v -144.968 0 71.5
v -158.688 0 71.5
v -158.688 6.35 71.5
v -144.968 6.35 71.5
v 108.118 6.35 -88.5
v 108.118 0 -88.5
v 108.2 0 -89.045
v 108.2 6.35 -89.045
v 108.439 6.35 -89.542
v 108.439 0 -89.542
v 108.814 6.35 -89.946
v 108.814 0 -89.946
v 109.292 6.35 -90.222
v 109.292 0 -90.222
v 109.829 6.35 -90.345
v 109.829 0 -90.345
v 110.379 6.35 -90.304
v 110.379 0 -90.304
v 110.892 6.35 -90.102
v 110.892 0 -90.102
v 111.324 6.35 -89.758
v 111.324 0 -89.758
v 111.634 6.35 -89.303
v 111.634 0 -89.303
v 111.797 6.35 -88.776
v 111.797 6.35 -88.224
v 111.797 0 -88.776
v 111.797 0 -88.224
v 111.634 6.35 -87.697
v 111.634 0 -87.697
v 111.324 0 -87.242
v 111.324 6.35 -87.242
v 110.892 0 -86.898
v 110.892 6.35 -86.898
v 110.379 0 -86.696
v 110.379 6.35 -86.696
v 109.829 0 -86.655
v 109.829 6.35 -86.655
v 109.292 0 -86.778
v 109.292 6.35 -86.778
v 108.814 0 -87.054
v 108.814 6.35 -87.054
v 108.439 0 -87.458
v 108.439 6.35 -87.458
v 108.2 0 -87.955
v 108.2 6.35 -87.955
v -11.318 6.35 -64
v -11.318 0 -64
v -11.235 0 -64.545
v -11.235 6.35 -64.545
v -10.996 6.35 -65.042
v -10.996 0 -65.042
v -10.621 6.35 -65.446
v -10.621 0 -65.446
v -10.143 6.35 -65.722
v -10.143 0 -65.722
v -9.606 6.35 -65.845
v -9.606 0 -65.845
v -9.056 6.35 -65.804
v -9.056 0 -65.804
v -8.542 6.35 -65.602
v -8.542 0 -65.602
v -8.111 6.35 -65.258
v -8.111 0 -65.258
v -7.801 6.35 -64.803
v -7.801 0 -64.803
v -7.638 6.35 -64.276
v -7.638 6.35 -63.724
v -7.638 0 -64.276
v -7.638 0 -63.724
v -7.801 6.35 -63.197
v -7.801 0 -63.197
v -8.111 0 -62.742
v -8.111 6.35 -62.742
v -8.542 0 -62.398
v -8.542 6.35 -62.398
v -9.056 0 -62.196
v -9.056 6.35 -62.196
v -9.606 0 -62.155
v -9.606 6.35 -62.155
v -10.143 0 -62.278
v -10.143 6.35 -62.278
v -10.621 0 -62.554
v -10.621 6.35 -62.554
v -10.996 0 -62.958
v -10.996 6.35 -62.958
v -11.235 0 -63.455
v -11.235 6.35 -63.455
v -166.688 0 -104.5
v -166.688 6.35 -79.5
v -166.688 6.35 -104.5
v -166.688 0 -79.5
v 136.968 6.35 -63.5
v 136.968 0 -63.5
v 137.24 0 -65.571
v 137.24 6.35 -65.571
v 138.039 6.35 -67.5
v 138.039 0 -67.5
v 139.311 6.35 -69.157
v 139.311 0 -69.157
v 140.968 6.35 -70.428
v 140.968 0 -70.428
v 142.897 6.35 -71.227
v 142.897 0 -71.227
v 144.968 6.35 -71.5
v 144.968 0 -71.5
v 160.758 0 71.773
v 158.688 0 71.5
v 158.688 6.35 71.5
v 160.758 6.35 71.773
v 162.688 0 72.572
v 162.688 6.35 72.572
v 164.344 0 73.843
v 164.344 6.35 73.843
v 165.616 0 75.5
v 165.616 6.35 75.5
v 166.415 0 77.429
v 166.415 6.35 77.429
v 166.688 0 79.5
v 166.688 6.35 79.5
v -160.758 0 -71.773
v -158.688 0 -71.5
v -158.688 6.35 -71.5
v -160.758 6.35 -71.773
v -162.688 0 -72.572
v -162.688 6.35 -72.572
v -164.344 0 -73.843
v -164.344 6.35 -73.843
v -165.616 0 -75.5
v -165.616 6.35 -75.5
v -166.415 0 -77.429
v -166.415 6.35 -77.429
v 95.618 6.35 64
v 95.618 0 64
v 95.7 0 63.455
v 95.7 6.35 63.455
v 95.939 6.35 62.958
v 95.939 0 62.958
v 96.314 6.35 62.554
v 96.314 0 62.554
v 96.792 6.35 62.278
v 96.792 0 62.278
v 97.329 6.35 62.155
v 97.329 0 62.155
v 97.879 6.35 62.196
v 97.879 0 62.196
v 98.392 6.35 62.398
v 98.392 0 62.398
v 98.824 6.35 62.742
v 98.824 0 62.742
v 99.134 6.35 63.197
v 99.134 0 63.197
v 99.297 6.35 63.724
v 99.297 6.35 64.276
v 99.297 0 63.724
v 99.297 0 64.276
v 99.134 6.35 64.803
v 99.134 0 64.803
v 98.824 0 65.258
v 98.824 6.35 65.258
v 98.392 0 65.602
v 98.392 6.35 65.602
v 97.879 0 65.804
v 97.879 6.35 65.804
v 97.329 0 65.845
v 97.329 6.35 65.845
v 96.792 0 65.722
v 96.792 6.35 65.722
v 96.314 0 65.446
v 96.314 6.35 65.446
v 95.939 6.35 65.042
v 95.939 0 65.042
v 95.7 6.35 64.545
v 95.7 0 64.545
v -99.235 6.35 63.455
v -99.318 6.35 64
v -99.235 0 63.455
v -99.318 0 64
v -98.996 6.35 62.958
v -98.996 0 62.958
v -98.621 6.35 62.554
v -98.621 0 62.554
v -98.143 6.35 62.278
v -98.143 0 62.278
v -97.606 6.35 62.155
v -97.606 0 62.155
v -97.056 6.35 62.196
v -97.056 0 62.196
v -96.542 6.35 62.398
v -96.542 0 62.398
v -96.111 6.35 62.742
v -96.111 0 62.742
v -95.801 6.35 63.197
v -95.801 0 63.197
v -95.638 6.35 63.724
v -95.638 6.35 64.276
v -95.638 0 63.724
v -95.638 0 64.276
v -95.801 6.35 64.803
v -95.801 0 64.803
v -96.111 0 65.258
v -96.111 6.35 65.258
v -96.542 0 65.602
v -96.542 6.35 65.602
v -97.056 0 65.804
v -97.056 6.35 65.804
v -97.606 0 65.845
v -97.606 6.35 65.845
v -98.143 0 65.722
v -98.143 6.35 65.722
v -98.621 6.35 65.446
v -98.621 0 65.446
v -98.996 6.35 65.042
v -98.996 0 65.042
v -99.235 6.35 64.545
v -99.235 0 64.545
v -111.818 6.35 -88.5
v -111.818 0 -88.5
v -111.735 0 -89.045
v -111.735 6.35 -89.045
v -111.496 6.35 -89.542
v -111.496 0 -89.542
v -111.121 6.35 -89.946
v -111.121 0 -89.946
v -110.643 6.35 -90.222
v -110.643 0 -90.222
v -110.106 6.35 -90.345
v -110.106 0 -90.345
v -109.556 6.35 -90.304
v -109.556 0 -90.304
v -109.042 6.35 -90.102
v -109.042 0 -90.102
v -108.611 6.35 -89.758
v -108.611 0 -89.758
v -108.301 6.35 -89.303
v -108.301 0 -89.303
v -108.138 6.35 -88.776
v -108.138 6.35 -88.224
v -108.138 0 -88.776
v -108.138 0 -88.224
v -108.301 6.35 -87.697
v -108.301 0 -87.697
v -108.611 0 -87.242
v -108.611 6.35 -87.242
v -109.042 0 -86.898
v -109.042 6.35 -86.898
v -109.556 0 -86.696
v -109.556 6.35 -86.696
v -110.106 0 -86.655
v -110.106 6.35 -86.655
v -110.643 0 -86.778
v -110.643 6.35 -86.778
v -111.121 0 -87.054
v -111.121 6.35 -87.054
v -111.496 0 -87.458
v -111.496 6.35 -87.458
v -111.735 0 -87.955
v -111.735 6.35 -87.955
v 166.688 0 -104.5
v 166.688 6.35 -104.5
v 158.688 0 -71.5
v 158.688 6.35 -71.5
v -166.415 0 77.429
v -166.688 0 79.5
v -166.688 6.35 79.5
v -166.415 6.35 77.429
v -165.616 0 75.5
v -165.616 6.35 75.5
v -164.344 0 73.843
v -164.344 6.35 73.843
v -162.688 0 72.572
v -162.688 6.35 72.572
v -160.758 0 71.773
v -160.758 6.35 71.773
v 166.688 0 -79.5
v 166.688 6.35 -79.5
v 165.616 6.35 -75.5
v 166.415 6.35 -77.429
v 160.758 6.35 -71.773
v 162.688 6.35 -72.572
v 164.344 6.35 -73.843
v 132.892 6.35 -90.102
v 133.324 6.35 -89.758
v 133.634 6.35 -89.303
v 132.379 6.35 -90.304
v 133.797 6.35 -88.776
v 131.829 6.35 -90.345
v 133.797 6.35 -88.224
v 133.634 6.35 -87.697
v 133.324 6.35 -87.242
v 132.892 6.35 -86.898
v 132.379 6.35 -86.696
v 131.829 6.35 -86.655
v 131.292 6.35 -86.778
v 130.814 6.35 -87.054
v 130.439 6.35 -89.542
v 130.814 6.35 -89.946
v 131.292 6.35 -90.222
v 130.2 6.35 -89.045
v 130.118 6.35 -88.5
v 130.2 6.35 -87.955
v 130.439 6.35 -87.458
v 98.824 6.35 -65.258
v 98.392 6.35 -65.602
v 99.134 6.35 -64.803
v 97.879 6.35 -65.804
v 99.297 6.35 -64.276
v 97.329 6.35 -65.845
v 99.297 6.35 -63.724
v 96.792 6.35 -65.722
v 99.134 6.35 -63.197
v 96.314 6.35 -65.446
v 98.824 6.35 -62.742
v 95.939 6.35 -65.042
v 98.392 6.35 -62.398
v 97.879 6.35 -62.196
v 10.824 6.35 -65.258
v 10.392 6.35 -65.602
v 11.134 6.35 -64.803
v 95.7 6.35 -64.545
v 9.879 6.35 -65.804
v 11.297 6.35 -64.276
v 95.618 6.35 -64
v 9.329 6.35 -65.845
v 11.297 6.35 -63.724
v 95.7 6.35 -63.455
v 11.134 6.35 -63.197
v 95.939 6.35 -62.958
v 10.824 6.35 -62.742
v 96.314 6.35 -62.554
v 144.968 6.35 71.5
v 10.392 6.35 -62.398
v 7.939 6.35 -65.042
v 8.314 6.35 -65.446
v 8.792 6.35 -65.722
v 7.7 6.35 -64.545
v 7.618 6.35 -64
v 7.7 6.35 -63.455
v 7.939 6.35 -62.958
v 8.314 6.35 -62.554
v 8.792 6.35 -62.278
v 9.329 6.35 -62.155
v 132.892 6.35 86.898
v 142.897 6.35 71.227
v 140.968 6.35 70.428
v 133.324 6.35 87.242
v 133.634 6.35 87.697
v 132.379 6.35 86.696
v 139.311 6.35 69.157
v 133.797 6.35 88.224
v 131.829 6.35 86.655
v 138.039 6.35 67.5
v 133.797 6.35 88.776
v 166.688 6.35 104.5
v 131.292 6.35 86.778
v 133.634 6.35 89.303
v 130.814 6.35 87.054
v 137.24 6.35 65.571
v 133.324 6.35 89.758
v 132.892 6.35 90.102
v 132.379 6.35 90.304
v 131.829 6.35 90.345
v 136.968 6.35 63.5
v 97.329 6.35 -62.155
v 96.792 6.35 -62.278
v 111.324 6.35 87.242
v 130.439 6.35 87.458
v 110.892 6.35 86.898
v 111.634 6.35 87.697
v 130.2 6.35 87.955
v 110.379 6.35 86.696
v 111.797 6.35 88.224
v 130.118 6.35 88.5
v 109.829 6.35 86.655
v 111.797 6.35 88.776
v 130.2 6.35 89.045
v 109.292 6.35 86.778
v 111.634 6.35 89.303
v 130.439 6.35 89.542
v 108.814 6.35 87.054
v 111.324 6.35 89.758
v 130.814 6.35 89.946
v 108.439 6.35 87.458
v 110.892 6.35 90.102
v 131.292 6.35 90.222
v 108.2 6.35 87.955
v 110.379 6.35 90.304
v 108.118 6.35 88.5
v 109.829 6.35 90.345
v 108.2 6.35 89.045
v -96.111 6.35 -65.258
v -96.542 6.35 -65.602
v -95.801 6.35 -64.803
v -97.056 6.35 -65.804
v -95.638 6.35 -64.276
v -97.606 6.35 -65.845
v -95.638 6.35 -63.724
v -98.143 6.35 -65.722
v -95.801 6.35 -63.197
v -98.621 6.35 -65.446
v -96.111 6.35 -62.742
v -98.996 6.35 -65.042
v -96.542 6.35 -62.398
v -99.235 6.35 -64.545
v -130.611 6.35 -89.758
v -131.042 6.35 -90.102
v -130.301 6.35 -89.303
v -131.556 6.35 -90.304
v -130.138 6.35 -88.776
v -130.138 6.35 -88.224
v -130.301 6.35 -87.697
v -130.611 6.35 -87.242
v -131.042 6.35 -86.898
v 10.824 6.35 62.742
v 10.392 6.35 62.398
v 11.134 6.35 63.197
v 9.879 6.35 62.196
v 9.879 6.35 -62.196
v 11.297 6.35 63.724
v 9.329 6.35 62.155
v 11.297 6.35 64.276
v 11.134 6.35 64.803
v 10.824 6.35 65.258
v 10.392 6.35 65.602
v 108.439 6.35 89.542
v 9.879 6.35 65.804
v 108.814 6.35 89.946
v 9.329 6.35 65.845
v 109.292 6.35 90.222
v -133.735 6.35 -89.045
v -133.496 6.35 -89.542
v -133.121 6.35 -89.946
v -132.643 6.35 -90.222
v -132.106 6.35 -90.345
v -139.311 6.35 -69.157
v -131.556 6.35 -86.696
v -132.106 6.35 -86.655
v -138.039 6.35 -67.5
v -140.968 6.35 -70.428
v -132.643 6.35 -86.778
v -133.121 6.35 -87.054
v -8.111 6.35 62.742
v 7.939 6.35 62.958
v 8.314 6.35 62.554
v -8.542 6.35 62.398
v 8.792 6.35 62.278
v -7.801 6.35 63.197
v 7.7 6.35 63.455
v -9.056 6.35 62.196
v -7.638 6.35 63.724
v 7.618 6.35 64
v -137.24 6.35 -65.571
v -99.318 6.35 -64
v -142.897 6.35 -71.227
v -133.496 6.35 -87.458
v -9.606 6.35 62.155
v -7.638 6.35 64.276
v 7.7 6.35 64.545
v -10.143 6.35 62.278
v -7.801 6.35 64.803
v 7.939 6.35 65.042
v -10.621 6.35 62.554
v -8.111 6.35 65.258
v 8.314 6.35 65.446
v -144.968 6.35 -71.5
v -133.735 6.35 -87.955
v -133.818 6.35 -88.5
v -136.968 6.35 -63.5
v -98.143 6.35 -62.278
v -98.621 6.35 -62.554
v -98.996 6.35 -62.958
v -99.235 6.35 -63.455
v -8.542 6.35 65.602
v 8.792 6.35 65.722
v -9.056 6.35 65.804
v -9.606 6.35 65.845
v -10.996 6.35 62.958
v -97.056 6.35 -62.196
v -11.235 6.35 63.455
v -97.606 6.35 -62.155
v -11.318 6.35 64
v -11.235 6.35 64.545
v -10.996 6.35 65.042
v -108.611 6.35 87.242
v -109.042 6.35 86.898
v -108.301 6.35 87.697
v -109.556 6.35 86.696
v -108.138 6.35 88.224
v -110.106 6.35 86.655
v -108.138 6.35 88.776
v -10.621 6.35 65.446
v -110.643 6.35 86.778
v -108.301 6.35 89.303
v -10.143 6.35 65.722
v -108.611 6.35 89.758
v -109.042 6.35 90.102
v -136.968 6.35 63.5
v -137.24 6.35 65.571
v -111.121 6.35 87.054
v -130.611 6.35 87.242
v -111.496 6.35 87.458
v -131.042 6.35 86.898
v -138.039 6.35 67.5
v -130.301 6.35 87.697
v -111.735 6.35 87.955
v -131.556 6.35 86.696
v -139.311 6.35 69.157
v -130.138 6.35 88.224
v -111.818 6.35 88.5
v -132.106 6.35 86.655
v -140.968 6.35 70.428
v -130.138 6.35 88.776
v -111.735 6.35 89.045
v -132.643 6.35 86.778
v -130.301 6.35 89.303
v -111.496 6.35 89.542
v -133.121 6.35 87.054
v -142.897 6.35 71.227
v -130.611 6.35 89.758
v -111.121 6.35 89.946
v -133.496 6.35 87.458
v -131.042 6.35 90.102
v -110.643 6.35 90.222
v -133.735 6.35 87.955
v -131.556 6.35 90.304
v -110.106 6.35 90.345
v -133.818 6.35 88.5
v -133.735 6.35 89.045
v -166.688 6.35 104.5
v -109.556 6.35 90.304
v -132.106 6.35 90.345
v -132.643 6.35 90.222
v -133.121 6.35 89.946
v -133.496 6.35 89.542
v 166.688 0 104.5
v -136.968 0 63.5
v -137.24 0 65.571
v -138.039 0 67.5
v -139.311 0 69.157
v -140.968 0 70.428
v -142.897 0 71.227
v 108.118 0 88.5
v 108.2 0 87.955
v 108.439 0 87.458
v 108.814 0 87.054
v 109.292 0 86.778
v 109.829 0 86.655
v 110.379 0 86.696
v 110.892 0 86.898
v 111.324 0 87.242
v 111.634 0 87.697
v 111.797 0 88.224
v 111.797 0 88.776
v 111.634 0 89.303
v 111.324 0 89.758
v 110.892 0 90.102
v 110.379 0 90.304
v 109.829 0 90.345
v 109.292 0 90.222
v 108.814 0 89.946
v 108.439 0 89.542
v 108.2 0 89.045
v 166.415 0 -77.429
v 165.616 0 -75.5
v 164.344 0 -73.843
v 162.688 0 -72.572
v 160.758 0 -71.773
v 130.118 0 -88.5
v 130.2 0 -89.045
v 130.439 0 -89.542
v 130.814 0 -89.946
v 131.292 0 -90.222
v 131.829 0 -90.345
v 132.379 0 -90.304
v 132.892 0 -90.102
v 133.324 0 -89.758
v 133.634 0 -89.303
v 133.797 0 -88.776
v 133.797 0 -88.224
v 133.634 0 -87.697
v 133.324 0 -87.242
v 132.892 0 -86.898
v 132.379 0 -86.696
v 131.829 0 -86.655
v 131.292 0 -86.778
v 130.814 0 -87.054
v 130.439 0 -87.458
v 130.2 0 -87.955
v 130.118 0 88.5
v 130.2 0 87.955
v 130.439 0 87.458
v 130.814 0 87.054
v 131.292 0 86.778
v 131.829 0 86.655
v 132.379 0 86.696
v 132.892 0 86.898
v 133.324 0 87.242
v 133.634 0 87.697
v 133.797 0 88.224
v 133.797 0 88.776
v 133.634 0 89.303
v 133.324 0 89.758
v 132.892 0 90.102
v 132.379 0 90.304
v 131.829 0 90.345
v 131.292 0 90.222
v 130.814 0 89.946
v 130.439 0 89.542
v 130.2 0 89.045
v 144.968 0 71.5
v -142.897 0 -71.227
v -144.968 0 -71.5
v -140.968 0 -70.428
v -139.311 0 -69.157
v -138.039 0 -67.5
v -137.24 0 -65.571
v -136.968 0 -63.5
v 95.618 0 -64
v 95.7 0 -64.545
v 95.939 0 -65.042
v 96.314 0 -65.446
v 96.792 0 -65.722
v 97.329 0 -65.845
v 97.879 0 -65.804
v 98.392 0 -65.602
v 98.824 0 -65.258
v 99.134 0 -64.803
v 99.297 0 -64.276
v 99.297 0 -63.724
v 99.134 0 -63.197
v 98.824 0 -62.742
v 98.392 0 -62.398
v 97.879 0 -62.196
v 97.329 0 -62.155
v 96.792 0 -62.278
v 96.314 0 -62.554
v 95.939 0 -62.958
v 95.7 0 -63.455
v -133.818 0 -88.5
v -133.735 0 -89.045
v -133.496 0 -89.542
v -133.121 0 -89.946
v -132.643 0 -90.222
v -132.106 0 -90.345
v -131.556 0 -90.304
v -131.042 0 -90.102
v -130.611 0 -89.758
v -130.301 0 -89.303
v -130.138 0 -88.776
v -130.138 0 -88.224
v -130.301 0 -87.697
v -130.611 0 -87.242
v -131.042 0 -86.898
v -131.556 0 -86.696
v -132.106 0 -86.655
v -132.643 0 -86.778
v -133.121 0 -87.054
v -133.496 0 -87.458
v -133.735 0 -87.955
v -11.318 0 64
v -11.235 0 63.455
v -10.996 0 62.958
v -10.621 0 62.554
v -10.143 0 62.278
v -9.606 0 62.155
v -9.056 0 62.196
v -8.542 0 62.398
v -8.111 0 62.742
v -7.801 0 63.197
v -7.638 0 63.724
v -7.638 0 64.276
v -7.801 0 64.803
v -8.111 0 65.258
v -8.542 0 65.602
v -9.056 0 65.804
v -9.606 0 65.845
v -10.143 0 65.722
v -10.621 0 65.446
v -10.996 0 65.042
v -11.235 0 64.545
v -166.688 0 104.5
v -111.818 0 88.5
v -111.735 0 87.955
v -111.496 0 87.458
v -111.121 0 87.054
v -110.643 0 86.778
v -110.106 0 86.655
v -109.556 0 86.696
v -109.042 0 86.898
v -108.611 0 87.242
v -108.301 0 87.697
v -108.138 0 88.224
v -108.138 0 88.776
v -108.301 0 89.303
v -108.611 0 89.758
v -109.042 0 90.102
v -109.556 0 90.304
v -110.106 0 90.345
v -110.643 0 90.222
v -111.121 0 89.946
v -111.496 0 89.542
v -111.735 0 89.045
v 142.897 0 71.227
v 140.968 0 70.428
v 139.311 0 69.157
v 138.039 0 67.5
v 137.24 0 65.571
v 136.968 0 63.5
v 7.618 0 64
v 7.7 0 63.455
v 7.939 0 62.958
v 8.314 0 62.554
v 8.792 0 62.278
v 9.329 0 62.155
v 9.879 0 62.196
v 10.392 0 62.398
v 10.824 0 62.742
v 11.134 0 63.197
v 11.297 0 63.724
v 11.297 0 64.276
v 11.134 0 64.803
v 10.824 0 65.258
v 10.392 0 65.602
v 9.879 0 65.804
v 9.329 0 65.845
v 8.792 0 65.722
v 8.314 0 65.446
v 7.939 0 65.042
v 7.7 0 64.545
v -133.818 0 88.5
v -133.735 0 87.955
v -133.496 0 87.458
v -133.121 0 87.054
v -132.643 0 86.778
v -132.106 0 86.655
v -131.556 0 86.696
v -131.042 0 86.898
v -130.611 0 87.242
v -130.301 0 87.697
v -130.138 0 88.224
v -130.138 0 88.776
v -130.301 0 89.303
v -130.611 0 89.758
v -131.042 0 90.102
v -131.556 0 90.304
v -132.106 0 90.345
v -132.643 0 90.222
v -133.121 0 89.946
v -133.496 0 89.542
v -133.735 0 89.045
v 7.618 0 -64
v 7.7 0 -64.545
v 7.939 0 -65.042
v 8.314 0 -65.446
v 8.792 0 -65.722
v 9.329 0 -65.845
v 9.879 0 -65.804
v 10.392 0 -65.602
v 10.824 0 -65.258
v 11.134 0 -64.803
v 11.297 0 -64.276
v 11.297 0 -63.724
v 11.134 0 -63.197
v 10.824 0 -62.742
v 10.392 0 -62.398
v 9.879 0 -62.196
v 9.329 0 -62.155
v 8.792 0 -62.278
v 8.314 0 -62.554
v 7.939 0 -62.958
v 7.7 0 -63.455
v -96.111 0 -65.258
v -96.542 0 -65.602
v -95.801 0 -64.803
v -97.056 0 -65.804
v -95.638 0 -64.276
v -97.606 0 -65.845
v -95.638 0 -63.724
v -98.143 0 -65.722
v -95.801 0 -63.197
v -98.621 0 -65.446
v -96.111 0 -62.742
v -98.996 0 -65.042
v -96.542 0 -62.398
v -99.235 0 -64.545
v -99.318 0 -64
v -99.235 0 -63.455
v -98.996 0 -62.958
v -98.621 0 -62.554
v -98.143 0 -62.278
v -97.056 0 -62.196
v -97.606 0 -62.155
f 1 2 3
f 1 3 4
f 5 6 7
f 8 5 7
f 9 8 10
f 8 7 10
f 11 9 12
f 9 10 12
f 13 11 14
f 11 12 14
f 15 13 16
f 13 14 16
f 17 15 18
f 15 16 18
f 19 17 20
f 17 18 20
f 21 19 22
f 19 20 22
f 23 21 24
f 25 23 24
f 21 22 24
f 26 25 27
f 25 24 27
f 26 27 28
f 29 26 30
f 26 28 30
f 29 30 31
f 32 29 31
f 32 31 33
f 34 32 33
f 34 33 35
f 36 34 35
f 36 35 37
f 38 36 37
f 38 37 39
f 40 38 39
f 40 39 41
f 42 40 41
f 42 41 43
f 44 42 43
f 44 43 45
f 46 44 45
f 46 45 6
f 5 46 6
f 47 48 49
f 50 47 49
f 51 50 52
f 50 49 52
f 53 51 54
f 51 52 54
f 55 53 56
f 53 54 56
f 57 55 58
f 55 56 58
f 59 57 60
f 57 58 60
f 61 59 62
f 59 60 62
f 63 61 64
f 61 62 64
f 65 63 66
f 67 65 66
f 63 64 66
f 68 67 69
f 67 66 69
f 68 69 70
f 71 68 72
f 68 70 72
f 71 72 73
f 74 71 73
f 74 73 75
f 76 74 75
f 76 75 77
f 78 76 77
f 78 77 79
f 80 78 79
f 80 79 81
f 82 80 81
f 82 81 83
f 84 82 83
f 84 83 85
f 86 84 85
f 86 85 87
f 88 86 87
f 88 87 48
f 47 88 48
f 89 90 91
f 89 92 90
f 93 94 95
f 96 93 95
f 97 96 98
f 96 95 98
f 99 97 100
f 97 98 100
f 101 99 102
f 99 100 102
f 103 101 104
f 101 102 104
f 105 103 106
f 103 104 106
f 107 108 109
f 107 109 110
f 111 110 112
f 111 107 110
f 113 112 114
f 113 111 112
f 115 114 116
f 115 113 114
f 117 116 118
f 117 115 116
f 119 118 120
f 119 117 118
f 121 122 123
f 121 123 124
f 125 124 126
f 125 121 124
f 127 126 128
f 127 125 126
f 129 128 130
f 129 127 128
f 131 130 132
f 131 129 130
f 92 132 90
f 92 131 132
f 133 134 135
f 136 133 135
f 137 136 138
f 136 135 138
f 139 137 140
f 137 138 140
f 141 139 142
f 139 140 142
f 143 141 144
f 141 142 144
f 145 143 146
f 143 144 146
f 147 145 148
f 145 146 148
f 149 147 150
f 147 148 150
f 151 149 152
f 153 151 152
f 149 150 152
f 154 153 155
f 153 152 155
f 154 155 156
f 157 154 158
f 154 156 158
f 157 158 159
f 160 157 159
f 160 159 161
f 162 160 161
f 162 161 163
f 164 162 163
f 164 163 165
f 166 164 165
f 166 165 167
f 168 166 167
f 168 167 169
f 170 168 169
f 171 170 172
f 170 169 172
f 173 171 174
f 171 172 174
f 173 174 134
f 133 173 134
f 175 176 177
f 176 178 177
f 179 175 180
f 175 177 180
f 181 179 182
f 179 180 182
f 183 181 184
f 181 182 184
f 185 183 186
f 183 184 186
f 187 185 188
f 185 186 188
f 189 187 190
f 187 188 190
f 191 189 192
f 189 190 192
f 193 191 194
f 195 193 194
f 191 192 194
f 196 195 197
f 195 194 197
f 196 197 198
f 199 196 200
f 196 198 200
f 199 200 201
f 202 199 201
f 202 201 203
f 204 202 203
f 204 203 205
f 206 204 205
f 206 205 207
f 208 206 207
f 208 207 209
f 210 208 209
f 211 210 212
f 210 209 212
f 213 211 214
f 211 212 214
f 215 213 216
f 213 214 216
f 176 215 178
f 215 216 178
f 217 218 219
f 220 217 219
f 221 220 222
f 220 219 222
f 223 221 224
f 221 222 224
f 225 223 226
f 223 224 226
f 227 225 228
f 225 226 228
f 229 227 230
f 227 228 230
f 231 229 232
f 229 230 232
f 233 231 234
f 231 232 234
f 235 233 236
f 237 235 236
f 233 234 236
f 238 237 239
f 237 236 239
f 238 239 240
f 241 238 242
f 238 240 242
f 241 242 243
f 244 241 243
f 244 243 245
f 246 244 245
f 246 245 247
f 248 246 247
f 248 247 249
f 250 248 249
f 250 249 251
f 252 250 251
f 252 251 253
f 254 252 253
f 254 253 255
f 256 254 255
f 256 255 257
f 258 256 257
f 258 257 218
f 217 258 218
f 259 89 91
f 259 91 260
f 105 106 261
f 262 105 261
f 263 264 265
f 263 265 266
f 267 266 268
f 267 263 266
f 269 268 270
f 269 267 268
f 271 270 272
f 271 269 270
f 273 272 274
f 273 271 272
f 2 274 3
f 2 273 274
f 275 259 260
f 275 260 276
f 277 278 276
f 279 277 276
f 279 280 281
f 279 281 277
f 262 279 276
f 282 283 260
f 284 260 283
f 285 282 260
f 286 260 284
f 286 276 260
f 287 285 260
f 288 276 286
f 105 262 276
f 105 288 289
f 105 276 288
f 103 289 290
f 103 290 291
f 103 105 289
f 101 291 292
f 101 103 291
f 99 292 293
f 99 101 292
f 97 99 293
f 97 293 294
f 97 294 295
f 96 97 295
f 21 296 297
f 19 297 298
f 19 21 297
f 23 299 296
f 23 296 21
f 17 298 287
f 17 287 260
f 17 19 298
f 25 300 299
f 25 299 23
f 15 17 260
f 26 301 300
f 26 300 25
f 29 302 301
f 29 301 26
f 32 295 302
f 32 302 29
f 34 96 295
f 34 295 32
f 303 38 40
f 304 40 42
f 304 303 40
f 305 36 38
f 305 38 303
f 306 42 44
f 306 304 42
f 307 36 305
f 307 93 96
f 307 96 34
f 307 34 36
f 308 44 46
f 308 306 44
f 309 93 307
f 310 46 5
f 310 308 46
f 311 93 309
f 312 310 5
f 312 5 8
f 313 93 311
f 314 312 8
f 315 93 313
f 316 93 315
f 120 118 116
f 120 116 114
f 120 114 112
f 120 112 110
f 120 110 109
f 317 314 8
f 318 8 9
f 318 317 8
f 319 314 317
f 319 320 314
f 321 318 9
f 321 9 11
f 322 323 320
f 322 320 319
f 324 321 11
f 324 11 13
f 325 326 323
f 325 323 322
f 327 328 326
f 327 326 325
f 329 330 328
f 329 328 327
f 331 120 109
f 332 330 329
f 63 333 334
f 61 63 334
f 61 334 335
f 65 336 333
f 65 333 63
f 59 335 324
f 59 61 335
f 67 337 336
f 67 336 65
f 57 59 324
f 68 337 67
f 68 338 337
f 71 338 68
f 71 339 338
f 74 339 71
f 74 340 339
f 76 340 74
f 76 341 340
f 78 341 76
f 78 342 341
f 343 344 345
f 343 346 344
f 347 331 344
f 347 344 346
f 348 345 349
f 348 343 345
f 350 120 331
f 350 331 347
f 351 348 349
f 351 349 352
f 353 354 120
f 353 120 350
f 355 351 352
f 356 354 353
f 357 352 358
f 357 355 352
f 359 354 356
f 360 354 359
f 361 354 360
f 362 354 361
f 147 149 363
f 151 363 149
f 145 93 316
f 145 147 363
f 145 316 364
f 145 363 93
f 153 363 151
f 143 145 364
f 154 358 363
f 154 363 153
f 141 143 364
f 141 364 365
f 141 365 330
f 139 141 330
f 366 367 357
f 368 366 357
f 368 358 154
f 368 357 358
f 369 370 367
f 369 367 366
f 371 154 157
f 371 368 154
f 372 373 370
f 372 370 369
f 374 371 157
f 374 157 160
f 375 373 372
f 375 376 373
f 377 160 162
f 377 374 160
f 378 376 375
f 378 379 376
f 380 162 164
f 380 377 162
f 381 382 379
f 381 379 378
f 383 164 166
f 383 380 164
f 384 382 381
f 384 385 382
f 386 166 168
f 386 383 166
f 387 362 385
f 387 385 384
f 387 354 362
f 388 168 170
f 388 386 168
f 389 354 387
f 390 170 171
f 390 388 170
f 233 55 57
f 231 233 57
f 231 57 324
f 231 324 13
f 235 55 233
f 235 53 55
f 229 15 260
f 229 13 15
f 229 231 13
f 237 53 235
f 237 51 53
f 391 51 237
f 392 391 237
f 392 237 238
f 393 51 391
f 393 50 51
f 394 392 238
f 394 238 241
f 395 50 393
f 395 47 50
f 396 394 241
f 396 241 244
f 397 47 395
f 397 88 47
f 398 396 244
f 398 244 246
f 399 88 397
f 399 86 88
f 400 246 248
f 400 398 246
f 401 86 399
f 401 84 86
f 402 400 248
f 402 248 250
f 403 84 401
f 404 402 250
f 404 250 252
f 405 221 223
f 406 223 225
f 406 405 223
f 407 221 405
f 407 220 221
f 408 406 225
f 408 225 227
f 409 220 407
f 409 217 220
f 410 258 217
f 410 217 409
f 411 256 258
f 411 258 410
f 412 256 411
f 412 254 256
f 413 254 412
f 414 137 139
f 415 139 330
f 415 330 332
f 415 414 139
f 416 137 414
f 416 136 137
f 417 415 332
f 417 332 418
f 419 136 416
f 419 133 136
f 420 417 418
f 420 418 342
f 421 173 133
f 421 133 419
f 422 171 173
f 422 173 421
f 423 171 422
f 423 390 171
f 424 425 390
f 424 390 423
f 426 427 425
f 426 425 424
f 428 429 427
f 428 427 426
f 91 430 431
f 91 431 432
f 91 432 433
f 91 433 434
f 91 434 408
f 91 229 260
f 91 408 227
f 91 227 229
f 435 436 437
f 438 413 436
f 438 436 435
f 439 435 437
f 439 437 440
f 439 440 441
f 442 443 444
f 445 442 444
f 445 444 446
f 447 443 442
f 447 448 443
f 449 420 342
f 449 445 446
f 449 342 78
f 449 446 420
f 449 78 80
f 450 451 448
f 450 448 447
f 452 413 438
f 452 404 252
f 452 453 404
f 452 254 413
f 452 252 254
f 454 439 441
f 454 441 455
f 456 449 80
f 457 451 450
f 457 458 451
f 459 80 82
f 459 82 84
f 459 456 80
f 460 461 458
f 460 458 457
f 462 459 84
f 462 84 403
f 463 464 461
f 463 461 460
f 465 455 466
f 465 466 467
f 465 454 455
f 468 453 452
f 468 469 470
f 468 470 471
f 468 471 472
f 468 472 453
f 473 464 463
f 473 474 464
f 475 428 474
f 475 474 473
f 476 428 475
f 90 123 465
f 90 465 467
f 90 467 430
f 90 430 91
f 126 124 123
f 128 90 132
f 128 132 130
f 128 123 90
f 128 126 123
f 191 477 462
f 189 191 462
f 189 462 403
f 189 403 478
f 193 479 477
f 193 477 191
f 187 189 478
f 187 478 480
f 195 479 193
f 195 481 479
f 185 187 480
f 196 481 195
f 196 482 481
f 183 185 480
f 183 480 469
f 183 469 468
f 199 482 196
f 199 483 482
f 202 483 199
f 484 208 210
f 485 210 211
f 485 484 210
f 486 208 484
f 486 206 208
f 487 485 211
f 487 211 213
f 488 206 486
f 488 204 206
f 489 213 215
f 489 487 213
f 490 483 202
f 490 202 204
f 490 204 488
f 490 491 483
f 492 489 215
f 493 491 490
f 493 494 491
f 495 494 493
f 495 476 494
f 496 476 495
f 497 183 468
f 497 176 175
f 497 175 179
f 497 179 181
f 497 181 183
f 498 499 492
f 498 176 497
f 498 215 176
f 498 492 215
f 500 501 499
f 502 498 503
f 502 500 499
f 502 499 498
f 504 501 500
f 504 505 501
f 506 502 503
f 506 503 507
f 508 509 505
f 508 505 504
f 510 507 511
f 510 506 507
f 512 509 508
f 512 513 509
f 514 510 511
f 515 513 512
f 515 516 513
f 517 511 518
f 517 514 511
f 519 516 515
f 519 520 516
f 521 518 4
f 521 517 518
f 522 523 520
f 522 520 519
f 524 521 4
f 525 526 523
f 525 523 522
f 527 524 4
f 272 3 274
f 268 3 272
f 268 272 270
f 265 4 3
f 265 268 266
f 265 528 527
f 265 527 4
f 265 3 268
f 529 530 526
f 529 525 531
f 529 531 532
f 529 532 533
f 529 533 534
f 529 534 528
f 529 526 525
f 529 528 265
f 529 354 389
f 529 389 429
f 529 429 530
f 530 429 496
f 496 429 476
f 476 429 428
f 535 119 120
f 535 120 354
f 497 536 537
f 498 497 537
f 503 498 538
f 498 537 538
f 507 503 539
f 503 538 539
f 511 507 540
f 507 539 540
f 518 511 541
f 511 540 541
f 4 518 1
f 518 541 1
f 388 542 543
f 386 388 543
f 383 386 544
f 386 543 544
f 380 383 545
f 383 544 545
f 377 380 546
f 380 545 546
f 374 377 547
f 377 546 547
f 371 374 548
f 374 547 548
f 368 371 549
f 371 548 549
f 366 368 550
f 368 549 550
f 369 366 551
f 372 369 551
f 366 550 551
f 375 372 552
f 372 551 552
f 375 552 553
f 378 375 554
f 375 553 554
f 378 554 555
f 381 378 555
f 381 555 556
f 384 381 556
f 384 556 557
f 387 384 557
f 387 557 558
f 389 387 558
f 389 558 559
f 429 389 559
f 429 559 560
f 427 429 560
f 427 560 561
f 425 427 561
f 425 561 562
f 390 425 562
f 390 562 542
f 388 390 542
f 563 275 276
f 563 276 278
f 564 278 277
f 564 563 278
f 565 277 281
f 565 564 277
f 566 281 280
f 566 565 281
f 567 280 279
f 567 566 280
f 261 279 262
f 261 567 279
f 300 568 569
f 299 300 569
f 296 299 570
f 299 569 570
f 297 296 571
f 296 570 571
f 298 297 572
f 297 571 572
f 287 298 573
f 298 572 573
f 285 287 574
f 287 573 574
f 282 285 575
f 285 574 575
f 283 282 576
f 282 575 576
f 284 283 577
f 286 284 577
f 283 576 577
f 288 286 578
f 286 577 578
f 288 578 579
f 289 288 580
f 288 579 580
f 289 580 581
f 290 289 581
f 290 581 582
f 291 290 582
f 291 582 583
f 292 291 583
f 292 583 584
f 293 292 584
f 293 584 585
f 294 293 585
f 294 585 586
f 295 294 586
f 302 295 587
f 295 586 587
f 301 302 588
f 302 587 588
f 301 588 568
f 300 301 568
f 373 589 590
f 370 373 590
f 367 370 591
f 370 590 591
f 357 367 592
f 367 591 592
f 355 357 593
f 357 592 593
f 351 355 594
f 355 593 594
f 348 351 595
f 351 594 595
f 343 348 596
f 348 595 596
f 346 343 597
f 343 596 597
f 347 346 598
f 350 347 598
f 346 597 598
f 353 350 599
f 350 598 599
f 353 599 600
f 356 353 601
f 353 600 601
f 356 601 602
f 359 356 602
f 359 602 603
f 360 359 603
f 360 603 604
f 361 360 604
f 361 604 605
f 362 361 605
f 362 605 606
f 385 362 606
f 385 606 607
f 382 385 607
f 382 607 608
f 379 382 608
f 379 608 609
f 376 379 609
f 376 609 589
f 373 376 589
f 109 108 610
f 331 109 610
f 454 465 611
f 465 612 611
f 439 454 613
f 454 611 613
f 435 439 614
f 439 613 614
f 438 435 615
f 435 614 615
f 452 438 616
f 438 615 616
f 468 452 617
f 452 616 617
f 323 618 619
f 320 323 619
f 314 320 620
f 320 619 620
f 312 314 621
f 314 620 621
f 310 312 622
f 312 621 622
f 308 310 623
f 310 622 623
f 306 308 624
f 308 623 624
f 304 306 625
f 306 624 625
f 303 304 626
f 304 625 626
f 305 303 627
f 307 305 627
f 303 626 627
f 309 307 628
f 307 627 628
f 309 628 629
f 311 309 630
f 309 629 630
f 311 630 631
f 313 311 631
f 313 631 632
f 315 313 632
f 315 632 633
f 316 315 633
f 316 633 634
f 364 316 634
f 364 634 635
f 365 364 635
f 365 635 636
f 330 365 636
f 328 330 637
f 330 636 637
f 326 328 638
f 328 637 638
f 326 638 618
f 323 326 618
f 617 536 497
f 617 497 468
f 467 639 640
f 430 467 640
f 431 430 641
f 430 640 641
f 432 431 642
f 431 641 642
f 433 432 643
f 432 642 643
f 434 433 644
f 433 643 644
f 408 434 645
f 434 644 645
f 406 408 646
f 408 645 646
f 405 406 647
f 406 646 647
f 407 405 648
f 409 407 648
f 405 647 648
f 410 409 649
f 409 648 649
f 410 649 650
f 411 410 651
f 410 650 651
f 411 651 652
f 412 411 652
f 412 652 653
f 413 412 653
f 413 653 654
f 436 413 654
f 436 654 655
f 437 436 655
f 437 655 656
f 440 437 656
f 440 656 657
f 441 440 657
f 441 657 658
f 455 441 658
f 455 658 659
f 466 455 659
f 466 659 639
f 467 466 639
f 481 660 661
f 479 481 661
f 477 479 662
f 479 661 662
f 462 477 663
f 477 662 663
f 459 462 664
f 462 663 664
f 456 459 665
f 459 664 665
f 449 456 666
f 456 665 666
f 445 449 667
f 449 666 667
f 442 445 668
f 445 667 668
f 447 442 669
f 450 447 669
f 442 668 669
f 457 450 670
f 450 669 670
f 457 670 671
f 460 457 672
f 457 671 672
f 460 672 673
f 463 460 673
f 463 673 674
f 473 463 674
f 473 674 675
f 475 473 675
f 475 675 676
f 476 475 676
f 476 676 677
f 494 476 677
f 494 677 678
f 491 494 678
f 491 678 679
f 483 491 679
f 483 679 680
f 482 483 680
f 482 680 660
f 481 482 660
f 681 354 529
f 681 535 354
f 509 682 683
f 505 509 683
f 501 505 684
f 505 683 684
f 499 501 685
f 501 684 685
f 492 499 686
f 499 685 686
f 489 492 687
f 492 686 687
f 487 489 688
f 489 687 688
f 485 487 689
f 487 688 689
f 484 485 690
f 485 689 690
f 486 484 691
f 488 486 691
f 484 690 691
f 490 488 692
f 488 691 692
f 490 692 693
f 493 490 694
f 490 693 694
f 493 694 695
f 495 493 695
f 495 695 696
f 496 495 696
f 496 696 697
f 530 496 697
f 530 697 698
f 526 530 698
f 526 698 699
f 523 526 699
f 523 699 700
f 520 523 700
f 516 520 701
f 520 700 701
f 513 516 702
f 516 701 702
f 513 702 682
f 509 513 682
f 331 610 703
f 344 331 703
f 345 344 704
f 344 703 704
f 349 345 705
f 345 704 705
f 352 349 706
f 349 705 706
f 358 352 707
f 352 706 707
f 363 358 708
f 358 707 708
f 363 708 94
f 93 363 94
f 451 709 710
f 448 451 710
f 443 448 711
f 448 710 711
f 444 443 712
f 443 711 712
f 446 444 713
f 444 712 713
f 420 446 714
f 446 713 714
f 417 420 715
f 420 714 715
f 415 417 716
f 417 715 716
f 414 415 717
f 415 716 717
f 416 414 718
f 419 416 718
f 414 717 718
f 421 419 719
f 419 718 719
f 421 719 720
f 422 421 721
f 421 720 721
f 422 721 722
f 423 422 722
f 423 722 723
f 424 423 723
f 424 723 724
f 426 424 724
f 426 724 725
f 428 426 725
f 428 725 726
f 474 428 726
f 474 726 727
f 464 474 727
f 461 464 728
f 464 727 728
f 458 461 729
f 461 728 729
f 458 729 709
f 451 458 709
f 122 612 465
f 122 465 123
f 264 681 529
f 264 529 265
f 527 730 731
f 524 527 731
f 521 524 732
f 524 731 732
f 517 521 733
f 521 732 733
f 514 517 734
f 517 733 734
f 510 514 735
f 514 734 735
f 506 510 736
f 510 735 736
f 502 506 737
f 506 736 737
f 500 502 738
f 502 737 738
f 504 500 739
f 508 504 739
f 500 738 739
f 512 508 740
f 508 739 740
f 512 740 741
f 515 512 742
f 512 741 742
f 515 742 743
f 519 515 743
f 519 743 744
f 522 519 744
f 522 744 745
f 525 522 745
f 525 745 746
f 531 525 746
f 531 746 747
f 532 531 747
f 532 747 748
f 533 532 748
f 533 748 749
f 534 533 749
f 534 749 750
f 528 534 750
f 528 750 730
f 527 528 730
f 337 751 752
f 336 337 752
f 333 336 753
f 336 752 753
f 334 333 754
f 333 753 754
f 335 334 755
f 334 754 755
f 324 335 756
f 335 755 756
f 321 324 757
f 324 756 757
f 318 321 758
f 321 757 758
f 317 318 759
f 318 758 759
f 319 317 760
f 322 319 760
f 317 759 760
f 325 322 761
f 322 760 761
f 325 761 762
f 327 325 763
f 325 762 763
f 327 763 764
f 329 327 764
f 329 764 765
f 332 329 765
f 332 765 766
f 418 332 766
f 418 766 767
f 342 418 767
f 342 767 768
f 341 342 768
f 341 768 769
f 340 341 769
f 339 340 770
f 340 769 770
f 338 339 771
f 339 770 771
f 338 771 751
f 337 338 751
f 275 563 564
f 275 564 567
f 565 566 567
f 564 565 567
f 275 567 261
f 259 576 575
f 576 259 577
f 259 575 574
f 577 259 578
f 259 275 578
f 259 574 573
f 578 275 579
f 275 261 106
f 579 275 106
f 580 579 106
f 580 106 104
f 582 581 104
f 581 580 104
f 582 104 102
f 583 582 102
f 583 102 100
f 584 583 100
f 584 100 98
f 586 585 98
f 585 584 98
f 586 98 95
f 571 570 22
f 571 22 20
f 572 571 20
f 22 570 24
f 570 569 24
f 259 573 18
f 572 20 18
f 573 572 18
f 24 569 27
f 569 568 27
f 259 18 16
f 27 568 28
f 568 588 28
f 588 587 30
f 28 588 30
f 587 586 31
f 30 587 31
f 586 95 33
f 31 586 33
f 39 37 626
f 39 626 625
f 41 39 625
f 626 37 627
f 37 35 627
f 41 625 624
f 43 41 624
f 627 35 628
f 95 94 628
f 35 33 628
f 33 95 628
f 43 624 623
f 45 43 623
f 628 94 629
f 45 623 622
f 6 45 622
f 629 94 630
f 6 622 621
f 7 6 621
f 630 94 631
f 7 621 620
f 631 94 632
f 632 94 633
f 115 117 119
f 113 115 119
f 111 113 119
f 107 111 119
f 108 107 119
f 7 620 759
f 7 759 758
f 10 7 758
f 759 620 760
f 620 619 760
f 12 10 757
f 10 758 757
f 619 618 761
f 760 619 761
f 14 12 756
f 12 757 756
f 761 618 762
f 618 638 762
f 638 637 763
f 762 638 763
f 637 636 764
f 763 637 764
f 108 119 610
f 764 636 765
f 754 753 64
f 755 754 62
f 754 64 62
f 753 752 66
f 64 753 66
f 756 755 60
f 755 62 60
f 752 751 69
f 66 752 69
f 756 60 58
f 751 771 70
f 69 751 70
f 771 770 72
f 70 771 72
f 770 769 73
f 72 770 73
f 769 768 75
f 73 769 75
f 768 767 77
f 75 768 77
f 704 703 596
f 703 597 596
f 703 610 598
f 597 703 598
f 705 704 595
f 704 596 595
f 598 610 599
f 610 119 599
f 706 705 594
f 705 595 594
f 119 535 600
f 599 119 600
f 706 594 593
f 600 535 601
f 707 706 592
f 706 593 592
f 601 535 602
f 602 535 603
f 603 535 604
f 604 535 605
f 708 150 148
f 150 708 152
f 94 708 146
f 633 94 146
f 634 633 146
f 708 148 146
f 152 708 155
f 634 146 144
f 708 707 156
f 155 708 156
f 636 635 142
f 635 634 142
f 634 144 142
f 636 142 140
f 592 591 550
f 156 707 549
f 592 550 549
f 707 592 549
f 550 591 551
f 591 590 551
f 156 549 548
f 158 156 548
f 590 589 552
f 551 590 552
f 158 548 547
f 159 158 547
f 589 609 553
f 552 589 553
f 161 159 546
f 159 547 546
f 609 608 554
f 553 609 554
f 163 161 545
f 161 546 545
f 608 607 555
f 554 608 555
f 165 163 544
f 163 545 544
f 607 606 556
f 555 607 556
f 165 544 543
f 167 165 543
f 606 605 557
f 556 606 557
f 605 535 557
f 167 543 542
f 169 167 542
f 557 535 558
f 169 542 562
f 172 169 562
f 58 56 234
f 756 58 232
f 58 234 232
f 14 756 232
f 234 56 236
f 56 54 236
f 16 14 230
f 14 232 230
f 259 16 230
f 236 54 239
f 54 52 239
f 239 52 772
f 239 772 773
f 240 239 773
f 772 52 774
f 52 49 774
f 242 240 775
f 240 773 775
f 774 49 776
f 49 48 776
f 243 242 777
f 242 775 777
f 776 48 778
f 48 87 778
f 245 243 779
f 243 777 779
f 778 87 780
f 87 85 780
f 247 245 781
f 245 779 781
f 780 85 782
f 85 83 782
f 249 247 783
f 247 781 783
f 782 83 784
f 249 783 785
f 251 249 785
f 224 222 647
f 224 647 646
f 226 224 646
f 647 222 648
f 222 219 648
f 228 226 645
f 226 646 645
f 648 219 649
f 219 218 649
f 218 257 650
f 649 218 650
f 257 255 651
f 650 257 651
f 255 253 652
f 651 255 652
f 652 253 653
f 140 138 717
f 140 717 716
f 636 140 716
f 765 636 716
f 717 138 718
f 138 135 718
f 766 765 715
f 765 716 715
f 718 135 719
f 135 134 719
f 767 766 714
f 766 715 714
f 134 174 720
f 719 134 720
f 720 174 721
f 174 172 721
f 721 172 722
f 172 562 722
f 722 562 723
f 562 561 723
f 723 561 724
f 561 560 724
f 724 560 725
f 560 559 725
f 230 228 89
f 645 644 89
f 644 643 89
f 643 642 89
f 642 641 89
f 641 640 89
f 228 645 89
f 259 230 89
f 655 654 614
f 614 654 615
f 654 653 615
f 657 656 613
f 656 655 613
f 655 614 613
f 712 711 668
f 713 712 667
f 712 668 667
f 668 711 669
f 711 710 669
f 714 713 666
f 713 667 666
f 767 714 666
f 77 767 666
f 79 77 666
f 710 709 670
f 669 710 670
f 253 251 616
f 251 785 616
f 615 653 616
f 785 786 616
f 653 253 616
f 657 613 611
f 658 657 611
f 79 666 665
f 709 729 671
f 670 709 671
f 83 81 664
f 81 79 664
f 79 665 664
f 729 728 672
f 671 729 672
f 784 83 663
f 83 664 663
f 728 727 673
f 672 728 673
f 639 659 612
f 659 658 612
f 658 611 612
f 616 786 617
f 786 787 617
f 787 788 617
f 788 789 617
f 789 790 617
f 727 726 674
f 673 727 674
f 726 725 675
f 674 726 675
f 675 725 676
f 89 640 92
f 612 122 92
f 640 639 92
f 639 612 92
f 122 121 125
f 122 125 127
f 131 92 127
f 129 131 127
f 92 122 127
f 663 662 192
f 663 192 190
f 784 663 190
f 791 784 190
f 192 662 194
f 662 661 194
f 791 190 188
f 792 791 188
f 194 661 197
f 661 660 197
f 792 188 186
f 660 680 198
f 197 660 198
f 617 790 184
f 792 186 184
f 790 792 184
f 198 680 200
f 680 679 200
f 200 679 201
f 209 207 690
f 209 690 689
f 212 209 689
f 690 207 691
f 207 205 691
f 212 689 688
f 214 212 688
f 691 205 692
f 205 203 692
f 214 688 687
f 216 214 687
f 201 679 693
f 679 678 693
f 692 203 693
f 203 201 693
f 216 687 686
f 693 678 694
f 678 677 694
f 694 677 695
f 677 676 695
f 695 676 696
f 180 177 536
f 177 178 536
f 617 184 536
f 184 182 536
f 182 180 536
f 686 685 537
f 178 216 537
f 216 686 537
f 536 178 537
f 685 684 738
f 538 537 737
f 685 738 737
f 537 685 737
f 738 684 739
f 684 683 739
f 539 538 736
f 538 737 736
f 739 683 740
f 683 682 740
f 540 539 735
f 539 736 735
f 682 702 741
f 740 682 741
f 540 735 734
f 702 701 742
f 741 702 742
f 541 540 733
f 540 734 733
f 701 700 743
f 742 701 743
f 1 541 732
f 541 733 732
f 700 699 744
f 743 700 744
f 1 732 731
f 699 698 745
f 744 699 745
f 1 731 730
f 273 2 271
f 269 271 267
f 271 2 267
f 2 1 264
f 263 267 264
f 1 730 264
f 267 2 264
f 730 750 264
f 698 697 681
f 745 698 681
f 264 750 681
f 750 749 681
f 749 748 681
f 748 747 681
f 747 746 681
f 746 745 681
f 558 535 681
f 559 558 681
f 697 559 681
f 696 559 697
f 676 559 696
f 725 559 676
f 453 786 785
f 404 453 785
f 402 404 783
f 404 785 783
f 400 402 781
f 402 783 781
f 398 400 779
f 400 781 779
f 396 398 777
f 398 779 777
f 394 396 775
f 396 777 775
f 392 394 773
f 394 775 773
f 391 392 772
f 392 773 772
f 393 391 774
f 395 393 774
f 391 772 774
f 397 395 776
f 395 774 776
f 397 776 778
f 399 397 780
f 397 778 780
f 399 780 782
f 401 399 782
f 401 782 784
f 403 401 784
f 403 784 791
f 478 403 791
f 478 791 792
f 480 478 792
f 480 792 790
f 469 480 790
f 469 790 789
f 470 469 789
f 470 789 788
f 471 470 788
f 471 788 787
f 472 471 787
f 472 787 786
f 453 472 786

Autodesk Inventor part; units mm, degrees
ref_plane "YZ Plane" through (0, 0, 0) normal (1, 0, 0) x (0, 1, 0)
ref_plane "XZ Plane" through (0, 0, 0) normal (0, 1, 0) x (-1, 0, 0)
ref_plane "XY Plane" through (0, 0, 0) normal (0, 0, 1) x (1, 0, 0)
sketch "Sketch1" plane through (0, 0, 0) normal (0, 1, 0) x (-1, 0, 0)
  line L0 (-166.6875, 104.5) -> (166.6875, 104.5)
  line L1 (166.6875, -104.5) -> (-166.6875, -104.5)
  line L2 (-166.6875, 104.5) -> (166.6875, -104.5) construction
  line L3 (166.6875, 104.5) -> (-166.6875, -104.5) construction
  line L4 (166.6875, 88.5) -> (-166.6875, 88.5)
  line L5 (166.6875, -88.5) -> (-166.6875, -88.5)
  line L6 (120.9675, 104.5) -> (120.9675, -104.5)
  line L7 (-120.9675, 104.5) -> (-120.9675, -104.5)
  line L8 (-109.9675, 104.5) -> (-109.9675, -104.5)
  line L9 (-131.9675, 104.5) -> (-131.9675, -104.5)
  circle A0 centre (-109.9675, 88.5) radius 1.85
  circle A1 centre (-131.9675, 88.5) radius 1.85
  circle A2 centre (-109.9675, -88.5) radius 1.85
  circle A3 centre (-131.9675, -88.5) radius 1.85
  line L10 (131.9675, 104.5) -> (131.9675, -104.5)
  line L11 (109.9675, 104.5) -> (109.9675, -104.5)
  circle A4 centre (131.9675, 88.5) radius 1.85
  circle A5 centre (131.9675, -88.5) radius 1.85
  line L12 (-109.9675, 104.5) -> (-109.9675, -104.5)
  circle A6 centre (109.9675, 88.5) radius 1.85
  circle A7 centre (109.9675, -88.5) radius 1.85
  line L13 (-104.9675, 71.5) -> (-1.9675, 71.5)
  line L14 (-1.9675, 71.5) -> (-1.9675, -71.5)
  line L15 (-1.9675, -71.5) -> (-104.9675, -71.5)
  line L16 (-104.9675, -71.5) -> (-104.9675, 71.5)
  line L17 (175.9652, 0) -> (-157.4098, 0)
  line L18 (104.9675, 71.5) -> (1.9675, 71.5)
  line L19 (1.9675, 71.5) -> (1.9675, -71.5)
  line L20 (1.9675, -71.5) -> (104.9675, -71.5)
  line L21 (104.9675, -71.5) -> (104.9675, 71.5)
  line L22 (9.4675, 64) -> (97.4675, 64)
  line L23 (97.4675, 64) -> (97.4675, -64)
  line L24 (97.4675, -64) -> (9.4675, -64)
  line L25 (9.4675, -64) -> (9.4675, 64)
  line L26 (-9.4675, 64) -> (-97.4675, 64)
  line L27 (-97.4675, 64) -> (-97.4675, -64)
  line L28 (-97.4675, -64) -> (-9.4675, -64)
  line L29 (-9.4675, -64) -> (-9.4675, 64)
  circle A8 centre (-9.4675, 64) radius 1.85
  circle A9 centre (-9.4675, -64) radius 1.85
  circle A10 centre (-97.4675, 64) radius 1.85
  circle A11 centre (-97.4675, -64) radius 1.85
  circle A12 centre (97.4675, 64) radius 1.85
  circle A13 centre (97.4675, -64) radius 1.85
  circle A14 centre (9.4675, -64) radius 1.85
  circle A15 centre (9.4675, 64) radius 1.85
  line L30 (-158.6875, 71.5) -> (-144.9675, 71.5)
  line L31 (-136.9675, 63.5) -> (-136.9675, -63.5)
  line L32 (-144.9675, -71.5) -> (-158.6875, -71.5)
  arc A16 (-136.9675, 63.5) -> (-144.9675, 71.5) centre (-144.9675, 63.5) ccw
  arc A17 (-144.9675, -71.5) -> (-136.9675, -63.5) centre (-144.9675, -63.5) ccw
  line L33 (-166.6875, -104.5) -> (-166.6875, -79.5)
  line L34 (-166.6875, 79.5) -> (-166.6875, 104.5)
  arc A18 (-166.6875, 79.5) -> (-158.6875, 71.5) centre (-158.6875, 79.5) ccw
  arc A19 (-158.6875, -71.5) -> (-166.6875, -79.5) centre (-158.6875, -79.5) ccw
  line L35 (158.6875, 71.5) -> (144.9675, 71.5)
  line L36 (136.9675, 63.5) -> (136.9675, -63.5)
  line L37 (144.9675, -71.5) -> (158.6875, -71.5)
  arc A20 (144.9675, 71.5) -> (136.9675, 63.5) centre (144.9675, 63.5) ccw
  arc A21 (136.9675, -63.5) -> (144.9675, -71.5) centre (144.9675, -63.5) ccw
  line L38 (166.6875, 104.5) -> (166.6875, 79.5)
  line L39 (166.6875, -79.5) -> (166.6875, -104.5)
  arc A22 (158.6875, 71.5) -> (166.6875, 79.5) centre (158.6875, 79.5) ccw
  arc A23 (166.6875, -79.5) -> (158.6875, -71.5) centre (158.6875, -79.5) ccw
  point P0 (0, 0)
  dimension "d0" = 209
  dimension "d6" = 22
  dimension "d8" = 3.7
  dimension "d11" = 22
  dimension "d19" = 16
  dimension "d20" = 16
  dimension "d24" = 143
  dimension "d25" = 103
  dimension "d26" = 16
  dimension "d27" = 143
  dimension "d28" = 103
  dimension "d29" = 16
  dimension "d30" = 7.5
  dimension "d31" = 7.5
  dimension "d34" = 3.7
  dimension "d36" = 8
  dimension "d39" = 16
  dimension "d40" = 143
  dimension "d41" = 333.375
  dimension "d42" = 45.72
  dimension "d45" = 45.72
  dimension "d48" = 16
  dimension "d49" = 143
  dimension "d50" = 553.31
  dimension "d51" = 9.2777
extrude "Extrusion1" add sketch "Sketch1" along normal blind 6.35 contours L0 L9 A1 L4 L34 | L0 L7 L4 A1 L9 | L4 A1 L9 L17 L31 A16 L30 A18 L34 | L0 L8 A0 L4 L7 | L0 L11 A6 L4 A0 L8 | L7 L17 L9 A1 L4 | L4 A0 L8 L17 L7 | L0 L6 L4 A6 L11 | L17 L8 A2 L5 L7 | L7 L5 A3 L9 L17 | L9 A3 L5 L33 A19 L32 A17 L31 L17 | L0 L10 A4 L4 L6 | L4 A6 L11 L17 L21 L18 L19 L14 L13 L16 L8 A0 | L7 L1 L9 A3 L5 | L5 A2 L8 L1 L7 | L17 L16 L15 L14 L19 L20 L21 L11 A7 L5 A2 L8 | L0 L38 L4 A4 L10 | L6 L17 L11 A6 L4 | L4 A4 L10 L17 L6 | L17 L27 A11 L28 A9 L29 L14 L15 L16 | L16 L13 L14 L17 L29 A8 L26 A10 L27 | A3 L9 L1 L33 L5 | L17 L10 A5 L5 L6 | L6 L5 A7 L11 L17 | A2 L5 A7 L11 L1 L8 | L27 A10 L26 A8 L29 L17 | L17 L29 A9 L28 A11 L27 | L38 A22 L35 A20 L36 L17 L10 A4 L4 | L6 L1 L11 A7 L5 | L5 A5 L10 L1 L6 | L17 L36 A21 L37 A23 L39 L5 A5 L10 | L21 L20 L19 L17 L25 A14 L24 A13 L23 | L17 L23 A12 L22 A15 L25 L19 L18 L21 | A5 L5 L39 L1 L10 | L23 A13 L24 A14 L25 L17 | L17 L25 A15 L22 A12 L23
properties part number "BasePlate"
